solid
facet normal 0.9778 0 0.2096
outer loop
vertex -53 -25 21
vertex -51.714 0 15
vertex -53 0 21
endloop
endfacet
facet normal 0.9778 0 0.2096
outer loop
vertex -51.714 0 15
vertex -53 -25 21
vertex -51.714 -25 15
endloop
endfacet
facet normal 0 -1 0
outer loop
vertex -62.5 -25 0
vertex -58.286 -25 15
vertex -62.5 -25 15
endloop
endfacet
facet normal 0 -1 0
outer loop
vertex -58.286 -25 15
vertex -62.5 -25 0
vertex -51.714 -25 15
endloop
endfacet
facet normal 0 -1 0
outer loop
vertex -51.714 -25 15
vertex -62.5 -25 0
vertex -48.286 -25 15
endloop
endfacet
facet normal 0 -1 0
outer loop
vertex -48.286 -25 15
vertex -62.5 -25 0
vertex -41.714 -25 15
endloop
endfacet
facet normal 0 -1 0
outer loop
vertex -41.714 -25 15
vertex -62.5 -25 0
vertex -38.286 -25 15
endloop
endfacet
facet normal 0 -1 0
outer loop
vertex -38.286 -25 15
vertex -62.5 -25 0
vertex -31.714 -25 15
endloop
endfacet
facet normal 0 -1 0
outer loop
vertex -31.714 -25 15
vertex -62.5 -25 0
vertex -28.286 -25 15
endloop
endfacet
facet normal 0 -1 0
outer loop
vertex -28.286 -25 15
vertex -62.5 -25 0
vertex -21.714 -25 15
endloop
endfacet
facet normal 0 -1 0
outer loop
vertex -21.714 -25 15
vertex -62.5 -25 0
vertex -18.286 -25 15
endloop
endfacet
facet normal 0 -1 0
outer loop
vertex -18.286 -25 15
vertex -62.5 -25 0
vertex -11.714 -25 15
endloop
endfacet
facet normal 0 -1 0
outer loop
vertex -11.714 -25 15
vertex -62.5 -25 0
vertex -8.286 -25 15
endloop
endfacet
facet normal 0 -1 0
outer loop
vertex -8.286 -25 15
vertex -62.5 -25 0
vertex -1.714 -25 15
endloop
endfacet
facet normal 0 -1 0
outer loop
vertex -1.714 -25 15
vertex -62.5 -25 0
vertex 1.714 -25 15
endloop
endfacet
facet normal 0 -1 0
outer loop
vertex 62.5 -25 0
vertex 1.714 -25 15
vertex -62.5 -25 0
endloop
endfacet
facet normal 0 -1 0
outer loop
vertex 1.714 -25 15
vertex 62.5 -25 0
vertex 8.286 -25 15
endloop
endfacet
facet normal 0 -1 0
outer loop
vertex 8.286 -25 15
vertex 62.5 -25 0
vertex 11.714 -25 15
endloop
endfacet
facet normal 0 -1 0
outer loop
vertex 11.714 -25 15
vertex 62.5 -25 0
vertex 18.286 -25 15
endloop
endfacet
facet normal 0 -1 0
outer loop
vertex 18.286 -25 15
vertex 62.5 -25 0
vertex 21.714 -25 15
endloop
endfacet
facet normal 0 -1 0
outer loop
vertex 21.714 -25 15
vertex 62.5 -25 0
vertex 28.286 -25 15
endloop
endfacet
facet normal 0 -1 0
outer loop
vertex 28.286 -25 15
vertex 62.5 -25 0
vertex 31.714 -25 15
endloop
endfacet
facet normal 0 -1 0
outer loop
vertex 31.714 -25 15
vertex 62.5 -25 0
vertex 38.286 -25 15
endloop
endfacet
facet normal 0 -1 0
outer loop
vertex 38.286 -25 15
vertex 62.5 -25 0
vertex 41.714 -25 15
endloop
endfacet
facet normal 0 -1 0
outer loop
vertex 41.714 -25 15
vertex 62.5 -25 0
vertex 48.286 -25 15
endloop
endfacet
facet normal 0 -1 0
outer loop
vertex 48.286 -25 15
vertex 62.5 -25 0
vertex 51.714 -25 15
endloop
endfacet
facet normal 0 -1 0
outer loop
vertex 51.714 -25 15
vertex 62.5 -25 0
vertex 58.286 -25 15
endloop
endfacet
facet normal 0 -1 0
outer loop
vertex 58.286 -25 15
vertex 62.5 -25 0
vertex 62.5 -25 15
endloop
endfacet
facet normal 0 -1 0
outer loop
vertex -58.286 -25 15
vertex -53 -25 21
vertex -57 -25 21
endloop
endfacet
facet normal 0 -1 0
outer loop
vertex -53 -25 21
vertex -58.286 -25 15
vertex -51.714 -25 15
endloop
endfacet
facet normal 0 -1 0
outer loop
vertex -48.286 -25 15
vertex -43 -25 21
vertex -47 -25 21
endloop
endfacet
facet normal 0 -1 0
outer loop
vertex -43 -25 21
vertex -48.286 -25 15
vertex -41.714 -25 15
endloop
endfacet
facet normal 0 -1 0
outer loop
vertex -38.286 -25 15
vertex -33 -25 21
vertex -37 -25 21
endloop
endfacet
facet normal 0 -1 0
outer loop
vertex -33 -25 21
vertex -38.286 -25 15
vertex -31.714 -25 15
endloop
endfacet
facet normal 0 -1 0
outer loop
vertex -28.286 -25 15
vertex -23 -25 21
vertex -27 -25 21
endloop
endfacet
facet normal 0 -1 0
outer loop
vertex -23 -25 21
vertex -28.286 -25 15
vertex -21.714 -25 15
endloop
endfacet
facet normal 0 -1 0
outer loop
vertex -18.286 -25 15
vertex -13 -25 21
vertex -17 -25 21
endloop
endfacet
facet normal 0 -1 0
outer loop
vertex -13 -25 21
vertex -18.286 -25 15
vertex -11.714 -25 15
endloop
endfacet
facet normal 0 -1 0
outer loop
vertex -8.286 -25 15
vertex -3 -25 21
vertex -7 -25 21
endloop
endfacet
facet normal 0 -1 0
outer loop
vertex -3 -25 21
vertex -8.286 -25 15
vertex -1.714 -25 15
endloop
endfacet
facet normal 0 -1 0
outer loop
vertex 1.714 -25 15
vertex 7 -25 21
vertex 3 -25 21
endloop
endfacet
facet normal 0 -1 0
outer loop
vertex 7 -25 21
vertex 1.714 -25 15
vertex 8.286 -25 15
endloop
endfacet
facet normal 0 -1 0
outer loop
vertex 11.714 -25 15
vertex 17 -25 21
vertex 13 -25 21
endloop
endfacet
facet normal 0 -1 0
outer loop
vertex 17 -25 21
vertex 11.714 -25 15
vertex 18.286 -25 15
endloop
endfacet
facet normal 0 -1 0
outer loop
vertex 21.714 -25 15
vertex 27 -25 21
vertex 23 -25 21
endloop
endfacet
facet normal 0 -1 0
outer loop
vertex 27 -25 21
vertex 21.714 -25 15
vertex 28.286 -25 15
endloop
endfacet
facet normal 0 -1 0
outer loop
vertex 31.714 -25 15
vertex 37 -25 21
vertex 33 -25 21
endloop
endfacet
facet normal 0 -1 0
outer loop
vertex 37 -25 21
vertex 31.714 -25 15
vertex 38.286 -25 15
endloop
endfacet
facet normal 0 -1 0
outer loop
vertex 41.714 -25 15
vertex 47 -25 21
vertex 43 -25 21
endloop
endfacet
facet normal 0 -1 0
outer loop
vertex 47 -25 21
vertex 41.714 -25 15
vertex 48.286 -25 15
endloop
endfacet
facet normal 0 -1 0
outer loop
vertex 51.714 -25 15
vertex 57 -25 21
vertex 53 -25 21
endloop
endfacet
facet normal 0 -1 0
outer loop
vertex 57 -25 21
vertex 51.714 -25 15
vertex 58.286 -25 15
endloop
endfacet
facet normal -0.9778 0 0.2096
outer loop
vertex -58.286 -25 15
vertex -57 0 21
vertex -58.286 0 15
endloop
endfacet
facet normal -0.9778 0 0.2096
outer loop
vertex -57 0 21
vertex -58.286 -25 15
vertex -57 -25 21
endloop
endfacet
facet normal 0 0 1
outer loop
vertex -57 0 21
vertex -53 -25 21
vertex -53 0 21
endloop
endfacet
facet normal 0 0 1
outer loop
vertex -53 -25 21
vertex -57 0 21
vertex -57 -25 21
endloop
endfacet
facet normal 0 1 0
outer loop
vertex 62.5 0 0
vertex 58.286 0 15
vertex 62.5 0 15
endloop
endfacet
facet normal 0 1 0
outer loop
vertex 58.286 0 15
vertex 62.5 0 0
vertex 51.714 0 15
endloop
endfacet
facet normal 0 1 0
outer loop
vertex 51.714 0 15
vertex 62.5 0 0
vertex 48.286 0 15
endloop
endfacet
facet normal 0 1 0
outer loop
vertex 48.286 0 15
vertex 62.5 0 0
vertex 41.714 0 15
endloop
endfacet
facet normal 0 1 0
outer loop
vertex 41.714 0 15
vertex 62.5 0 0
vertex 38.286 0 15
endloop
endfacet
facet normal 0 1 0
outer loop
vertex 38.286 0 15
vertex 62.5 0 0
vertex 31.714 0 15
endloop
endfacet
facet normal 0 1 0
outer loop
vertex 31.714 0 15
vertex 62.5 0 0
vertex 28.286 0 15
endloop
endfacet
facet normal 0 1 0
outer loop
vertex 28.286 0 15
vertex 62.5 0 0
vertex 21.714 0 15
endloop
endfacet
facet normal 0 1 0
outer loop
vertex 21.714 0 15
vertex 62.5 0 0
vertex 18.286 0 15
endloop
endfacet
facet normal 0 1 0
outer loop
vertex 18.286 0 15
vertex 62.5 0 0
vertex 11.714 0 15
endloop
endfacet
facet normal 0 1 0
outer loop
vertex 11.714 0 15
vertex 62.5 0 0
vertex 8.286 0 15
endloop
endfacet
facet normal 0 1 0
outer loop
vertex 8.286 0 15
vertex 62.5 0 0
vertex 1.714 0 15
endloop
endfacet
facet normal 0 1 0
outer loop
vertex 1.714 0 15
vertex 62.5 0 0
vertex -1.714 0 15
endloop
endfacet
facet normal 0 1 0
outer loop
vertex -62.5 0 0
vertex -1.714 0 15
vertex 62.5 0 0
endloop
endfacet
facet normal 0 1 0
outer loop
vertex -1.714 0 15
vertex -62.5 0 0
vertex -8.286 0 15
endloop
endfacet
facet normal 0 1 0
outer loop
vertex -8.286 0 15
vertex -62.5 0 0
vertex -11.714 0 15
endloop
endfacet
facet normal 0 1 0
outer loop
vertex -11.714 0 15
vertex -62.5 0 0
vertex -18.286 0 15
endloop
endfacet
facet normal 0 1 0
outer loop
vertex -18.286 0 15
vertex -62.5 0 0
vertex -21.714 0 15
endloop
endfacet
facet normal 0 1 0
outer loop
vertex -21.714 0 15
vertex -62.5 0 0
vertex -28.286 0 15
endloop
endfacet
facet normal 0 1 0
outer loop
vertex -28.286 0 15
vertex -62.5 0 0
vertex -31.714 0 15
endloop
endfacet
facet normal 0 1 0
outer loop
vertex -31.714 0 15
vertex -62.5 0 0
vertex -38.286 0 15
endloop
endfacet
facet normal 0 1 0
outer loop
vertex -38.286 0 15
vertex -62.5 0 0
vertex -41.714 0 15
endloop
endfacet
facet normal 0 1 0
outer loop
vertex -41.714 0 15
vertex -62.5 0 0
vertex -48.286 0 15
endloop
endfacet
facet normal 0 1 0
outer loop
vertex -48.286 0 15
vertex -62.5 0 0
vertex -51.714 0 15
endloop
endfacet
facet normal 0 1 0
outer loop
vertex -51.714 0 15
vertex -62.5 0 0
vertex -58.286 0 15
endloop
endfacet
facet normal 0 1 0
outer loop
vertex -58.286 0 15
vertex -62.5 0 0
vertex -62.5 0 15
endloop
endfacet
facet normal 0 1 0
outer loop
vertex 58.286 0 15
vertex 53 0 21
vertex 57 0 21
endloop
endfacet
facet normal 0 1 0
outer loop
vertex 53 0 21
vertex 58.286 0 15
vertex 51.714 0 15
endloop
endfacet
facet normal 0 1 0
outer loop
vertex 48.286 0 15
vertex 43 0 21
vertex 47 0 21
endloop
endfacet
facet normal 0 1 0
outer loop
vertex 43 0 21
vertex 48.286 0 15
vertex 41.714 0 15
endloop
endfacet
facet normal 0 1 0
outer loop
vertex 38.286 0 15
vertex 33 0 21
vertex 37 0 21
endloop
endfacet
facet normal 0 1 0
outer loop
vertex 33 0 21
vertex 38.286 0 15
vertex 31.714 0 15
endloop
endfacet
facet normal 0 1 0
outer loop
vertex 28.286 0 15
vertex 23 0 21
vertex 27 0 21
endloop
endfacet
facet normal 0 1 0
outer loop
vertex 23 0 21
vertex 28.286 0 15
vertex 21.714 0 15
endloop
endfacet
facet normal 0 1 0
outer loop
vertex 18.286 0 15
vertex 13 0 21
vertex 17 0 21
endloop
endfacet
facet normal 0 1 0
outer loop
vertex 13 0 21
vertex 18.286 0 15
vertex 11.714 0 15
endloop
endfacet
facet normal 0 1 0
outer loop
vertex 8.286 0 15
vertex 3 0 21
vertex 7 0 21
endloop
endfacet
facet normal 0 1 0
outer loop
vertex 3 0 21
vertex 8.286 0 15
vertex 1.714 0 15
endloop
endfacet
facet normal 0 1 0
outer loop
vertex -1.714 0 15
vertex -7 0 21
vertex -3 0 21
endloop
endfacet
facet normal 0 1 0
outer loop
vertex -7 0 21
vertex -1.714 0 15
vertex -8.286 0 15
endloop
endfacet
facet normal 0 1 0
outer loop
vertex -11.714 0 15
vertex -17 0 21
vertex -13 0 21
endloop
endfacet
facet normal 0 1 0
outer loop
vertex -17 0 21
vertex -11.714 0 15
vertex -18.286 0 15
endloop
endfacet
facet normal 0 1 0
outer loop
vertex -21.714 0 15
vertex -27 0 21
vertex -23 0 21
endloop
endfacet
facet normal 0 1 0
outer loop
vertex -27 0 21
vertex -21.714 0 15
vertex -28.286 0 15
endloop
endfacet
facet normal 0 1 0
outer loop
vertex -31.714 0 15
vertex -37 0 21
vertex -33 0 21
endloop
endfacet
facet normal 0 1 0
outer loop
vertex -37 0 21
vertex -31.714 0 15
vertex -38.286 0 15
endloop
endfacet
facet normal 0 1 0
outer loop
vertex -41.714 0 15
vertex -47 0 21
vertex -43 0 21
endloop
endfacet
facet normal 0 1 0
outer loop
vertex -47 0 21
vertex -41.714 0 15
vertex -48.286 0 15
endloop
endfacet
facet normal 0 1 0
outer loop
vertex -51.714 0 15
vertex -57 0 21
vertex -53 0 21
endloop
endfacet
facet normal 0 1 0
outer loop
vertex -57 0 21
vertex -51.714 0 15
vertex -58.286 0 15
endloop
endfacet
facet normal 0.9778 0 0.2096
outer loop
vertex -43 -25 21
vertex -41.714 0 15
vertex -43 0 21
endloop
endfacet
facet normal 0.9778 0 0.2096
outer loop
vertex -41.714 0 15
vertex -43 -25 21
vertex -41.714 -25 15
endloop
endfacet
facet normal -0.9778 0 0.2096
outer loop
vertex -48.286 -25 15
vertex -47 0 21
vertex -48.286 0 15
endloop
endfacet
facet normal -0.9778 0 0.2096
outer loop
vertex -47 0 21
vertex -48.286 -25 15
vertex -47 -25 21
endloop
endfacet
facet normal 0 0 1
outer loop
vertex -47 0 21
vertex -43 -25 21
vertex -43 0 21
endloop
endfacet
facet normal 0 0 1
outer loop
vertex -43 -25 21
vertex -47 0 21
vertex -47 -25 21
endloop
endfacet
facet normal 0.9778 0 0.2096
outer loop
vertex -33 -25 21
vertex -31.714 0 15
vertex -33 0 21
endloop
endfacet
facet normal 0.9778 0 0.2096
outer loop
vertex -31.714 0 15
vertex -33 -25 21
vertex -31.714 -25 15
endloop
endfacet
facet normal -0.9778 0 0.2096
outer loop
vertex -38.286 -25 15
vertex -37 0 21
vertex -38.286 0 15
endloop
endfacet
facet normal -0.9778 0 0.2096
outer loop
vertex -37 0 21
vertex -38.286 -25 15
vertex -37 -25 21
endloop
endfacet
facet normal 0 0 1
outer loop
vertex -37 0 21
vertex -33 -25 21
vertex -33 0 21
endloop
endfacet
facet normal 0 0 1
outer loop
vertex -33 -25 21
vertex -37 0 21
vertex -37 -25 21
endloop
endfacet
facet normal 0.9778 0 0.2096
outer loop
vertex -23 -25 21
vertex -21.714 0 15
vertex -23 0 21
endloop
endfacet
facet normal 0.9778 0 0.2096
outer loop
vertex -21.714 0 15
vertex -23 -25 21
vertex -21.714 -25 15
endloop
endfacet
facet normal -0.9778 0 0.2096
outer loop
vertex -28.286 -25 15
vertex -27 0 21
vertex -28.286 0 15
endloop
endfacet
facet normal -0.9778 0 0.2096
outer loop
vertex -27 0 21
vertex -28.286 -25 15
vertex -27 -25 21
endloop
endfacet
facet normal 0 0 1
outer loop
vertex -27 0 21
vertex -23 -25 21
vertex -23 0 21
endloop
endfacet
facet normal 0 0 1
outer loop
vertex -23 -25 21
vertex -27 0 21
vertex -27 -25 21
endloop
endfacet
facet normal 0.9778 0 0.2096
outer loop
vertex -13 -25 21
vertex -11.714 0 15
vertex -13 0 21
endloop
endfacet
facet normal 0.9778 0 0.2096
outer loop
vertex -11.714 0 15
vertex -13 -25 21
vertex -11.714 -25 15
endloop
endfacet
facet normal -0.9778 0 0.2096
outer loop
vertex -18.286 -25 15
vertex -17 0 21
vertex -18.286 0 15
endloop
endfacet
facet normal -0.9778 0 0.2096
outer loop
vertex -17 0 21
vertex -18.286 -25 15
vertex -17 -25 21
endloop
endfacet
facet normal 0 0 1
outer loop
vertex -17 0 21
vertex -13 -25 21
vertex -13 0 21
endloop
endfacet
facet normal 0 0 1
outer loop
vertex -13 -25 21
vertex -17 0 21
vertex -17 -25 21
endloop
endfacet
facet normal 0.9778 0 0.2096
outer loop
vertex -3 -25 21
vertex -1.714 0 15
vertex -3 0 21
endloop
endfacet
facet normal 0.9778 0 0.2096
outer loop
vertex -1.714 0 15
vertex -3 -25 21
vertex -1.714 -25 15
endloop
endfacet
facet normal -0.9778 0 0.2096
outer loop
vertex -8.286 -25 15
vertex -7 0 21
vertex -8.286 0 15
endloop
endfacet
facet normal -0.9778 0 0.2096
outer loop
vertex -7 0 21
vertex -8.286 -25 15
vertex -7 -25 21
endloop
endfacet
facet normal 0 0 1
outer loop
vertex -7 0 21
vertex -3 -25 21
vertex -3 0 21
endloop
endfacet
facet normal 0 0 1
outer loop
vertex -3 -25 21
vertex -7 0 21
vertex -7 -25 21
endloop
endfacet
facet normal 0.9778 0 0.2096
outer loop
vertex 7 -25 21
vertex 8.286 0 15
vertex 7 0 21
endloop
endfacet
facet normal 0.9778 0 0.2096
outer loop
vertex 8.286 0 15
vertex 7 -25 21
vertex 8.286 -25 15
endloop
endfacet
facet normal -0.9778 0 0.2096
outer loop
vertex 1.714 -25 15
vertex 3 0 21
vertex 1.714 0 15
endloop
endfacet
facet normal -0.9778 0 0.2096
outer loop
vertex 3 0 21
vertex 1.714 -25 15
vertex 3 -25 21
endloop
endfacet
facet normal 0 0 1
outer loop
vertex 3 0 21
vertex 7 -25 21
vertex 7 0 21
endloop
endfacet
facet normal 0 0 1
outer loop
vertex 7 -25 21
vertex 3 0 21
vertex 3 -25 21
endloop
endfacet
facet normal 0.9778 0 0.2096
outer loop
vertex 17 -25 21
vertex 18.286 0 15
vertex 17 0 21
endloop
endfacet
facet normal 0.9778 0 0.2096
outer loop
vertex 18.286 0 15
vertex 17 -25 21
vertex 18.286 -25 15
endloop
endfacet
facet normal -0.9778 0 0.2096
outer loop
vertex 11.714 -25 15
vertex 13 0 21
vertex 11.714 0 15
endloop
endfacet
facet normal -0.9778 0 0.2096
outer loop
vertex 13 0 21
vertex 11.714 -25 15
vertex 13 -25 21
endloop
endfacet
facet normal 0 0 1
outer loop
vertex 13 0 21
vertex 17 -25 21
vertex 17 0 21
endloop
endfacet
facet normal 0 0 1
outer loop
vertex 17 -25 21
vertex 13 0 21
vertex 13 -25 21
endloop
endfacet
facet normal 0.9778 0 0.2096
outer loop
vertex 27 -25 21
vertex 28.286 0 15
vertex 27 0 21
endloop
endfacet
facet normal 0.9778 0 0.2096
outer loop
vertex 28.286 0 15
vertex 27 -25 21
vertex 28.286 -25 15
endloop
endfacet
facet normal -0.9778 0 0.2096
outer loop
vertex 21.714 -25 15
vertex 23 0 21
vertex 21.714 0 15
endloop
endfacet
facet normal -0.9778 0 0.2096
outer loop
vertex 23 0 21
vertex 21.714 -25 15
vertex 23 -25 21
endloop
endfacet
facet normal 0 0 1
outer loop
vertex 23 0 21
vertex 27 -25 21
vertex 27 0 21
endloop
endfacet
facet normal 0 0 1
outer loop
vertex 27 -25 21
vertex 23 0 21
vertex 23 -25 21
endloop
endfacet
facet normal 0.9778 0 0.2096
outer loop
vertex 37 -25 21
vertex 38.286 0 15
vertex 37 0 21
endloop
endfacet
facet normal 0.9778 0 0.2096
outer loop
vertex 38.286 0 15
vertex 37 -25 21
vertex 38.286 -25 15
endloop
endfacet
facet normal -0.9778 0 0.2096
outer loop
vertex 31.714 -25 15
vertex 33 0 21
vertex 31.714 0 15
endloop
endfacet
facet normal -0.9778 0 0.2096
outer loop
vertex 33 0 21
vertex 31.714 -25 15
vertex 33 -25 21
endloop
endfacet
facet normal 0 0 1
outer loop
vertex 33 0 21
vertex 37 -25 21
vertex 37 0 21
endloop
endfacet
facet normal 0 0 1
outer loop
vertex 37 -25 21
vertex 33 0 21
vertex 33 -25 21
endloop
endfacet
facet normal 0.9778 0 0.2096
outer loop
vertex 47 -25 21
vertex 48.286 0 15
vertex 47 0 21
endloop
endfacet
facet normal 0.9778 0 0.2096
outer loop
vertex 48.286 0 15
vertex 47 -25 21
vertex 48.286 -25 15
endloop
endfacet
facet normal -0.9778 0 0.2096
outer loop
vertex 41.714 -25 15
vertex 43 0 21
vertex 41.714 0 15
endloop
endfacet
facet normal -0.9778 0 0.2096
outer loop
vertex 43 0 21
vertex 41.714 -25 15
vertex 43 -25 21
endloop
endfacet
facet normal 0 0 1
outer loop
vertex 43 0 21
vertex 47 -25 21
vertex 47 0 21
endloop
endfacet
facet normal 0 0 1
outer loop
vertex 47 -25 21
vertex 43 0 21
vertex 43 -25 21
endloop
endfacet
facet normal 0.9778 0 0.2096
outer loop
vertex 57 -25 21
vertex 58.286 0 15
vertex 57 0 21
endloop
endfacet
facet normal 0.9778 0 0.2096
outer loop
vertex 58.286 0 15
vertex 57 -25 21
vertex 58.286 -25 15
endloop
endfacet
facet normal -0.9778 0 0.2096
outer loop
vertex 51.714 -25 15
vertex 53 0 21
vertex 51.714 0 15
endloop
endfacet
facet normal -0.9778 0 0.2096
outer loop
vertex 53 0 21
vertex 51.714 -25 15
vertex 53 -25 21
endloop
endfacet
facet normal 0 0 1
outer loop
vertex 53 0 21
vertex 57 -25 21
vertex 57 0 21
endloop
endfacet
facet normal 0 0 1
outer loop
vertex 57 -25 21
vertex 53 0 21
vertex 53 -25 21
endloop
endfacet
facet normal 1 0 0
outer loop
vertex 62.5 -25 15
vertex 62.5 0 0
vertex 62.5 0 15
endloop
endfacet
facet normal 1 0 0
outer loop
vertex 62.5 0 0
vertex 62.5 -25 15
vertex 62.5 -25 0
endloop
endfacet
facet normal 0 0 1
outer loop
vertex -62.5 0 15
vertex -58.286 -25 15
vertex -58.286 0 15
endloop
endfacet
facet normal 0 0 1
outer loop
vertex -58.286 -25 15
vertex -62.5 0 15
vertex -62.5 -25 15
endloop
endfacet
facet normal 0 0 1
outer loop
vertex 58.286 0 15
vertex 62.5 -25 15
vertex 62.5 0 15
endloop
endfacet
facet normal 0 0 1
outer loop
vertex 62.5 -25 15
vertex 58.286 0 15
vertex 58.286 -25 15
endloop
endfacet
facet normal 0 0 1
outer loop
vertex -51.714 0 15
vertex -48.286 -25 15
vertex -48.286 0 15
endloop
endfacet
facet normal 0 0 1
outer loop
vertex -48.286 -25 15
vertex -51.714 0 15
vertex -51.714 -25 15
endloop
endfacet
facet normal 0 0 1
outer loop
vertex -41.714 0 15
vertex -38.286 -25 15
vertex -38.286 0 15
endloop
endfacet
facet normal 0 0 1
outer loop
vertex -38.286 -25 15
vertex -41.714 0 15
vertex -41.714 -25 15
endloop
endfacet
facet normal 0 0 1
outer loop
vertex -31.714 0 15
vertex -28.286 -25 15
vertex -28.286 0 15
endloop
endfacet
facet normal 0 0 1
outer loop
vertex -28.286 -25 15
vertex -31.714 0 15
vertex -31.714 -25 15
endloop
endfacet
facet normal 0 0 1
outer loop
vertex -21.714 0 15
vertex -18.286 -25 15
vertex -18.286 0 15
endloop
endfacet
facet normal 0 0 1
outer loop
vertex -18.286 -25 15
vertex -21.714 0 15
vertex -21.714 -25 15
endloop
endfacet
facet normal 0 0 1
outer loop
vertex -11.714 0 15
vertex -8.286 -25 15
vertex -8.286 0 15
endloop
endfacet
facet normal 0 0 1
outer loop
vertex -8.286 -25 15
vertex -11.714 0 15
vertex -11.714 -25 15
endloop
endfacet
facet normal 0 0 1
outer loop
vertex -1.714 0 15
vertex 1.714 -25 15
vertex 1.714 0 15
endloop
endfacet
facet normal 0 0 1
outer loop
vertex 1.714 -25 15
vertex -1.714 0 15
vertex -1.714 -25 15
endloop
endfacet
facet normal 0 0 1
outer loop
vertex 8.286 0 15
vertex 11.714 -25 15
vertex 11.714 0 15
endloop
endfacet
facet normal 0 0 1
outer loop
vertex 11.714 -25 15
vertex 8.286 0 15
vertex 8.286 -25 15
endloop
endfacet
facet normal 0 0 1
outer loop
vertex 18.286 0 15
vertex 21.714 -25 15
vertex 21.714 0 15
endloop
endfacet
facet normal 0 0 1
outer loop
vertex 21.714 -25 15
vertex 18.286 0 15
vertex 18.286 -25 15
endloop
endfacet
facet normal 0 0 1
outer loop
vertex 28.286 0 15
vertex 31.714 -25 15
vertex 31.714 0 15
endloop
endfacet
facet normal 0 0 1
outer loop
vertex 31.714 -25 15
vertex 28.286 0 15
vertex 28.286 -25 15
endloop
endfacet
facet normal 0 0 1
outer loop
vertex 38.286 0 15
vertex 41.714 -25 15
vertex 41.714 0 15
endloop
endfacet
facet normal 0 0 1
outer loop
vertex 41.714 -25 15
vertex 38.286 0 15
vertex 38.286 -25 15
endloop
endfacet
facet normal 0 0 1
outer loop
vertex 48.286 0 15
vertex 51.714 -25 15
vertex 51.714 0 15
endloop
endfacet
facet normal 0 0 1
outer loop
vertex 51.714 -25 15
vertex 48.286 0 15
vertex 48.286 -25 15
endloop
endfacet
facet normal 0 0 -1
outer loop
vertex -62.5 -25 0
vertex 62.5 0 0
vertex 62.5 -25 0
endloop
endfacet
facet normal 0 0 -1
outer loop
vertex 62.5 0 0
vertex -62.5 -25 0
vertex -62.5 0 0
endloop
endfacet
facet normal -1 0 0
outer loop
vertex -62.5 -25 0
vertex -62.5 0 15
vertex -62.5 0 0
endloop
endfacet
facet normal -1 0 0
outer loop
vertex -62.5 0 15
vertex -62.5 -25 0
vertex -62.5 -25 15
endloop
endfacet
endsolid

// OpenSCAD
$fn = 32;

// ----------------------------------------------------------------------
// Toothed rack, 12 teeth
// 10 mm pitch, 6 mm teeth
// ----------------------------------------------------------------------

// --- parameters (mm) ---
bar_w = 25;   // bar width (Y)
bar_h = 15;   // bar height (Z)
teeth = 12;   // number of teeth
pitch = 10;   // tooth pitch
tooth_h = 6;  // tooth height above the bar
root_w = 7;   // tooth width at the root
crest_w = 4;  // tooth width at the crest

// --- derived feature positions (mm) ---
span = (teeth - 1) * pitch;  // = 110   distance between the outer teeth
bar_l = span + root_w + 8;   // = 125   bar length: teeth plus 4 mm at each end
tooth_x = -span / 2;         // = -55   X of the first tooth
height = bar_h + tooth_h;    // = 21   overall height
feature_centers = [
  [tooth_x + 0 * pitch, -bar_w / 2],
  [tooth_x + 1 * pitch, -bar_w / 2],
  [tooth_x + 2 * pitch, -bar_w / 2],
  [tooth_x + 3 * pitch, -bar_w / 2],
  [tooth_x + 4 * pitch, -bar_w / 2],
  [tooth_x + 5 * pitch, -bar_w / 2],
  [tooth_x + 6 * pitch, -bar_w / 2],
  [tooth_x + 7 * pitch, -bar_w / 2],
  [tooth_x + 8 * pitch, -bar_w / 2],
  [tooth_x + 9 * pitch, -bar_w / 2],
  [tooth_x + 10 * pitch, -bar_w / 2],
  [tooth_x + 11 * pitch, -bar_w / 2]
];   // tooth centre line, drives the tooth loop

// bar with a rack of teeth, one extruded trapezoium per centre
module rack_tooth() {
  linear_extrude(height = bar_w)
    polygon(points = [
      [0, 0],
      [root_w, 0],
      [root_w / 2 + crest_w / 2, tooth_h + 1],
      [root_w / 2 - crest_w / 2, tooth_h + 1]
    ]);
}

union() {
  translate([-bar_l / 2, -bar_w, 0]) cube([bar_l, bar_w, bar_h]);
  for (centre = feature_centers)
    translate([centre[0] - root_w / 2, 0, bar_h - 1]) rotate([90, 0, 0]) rack_tooth();
}
